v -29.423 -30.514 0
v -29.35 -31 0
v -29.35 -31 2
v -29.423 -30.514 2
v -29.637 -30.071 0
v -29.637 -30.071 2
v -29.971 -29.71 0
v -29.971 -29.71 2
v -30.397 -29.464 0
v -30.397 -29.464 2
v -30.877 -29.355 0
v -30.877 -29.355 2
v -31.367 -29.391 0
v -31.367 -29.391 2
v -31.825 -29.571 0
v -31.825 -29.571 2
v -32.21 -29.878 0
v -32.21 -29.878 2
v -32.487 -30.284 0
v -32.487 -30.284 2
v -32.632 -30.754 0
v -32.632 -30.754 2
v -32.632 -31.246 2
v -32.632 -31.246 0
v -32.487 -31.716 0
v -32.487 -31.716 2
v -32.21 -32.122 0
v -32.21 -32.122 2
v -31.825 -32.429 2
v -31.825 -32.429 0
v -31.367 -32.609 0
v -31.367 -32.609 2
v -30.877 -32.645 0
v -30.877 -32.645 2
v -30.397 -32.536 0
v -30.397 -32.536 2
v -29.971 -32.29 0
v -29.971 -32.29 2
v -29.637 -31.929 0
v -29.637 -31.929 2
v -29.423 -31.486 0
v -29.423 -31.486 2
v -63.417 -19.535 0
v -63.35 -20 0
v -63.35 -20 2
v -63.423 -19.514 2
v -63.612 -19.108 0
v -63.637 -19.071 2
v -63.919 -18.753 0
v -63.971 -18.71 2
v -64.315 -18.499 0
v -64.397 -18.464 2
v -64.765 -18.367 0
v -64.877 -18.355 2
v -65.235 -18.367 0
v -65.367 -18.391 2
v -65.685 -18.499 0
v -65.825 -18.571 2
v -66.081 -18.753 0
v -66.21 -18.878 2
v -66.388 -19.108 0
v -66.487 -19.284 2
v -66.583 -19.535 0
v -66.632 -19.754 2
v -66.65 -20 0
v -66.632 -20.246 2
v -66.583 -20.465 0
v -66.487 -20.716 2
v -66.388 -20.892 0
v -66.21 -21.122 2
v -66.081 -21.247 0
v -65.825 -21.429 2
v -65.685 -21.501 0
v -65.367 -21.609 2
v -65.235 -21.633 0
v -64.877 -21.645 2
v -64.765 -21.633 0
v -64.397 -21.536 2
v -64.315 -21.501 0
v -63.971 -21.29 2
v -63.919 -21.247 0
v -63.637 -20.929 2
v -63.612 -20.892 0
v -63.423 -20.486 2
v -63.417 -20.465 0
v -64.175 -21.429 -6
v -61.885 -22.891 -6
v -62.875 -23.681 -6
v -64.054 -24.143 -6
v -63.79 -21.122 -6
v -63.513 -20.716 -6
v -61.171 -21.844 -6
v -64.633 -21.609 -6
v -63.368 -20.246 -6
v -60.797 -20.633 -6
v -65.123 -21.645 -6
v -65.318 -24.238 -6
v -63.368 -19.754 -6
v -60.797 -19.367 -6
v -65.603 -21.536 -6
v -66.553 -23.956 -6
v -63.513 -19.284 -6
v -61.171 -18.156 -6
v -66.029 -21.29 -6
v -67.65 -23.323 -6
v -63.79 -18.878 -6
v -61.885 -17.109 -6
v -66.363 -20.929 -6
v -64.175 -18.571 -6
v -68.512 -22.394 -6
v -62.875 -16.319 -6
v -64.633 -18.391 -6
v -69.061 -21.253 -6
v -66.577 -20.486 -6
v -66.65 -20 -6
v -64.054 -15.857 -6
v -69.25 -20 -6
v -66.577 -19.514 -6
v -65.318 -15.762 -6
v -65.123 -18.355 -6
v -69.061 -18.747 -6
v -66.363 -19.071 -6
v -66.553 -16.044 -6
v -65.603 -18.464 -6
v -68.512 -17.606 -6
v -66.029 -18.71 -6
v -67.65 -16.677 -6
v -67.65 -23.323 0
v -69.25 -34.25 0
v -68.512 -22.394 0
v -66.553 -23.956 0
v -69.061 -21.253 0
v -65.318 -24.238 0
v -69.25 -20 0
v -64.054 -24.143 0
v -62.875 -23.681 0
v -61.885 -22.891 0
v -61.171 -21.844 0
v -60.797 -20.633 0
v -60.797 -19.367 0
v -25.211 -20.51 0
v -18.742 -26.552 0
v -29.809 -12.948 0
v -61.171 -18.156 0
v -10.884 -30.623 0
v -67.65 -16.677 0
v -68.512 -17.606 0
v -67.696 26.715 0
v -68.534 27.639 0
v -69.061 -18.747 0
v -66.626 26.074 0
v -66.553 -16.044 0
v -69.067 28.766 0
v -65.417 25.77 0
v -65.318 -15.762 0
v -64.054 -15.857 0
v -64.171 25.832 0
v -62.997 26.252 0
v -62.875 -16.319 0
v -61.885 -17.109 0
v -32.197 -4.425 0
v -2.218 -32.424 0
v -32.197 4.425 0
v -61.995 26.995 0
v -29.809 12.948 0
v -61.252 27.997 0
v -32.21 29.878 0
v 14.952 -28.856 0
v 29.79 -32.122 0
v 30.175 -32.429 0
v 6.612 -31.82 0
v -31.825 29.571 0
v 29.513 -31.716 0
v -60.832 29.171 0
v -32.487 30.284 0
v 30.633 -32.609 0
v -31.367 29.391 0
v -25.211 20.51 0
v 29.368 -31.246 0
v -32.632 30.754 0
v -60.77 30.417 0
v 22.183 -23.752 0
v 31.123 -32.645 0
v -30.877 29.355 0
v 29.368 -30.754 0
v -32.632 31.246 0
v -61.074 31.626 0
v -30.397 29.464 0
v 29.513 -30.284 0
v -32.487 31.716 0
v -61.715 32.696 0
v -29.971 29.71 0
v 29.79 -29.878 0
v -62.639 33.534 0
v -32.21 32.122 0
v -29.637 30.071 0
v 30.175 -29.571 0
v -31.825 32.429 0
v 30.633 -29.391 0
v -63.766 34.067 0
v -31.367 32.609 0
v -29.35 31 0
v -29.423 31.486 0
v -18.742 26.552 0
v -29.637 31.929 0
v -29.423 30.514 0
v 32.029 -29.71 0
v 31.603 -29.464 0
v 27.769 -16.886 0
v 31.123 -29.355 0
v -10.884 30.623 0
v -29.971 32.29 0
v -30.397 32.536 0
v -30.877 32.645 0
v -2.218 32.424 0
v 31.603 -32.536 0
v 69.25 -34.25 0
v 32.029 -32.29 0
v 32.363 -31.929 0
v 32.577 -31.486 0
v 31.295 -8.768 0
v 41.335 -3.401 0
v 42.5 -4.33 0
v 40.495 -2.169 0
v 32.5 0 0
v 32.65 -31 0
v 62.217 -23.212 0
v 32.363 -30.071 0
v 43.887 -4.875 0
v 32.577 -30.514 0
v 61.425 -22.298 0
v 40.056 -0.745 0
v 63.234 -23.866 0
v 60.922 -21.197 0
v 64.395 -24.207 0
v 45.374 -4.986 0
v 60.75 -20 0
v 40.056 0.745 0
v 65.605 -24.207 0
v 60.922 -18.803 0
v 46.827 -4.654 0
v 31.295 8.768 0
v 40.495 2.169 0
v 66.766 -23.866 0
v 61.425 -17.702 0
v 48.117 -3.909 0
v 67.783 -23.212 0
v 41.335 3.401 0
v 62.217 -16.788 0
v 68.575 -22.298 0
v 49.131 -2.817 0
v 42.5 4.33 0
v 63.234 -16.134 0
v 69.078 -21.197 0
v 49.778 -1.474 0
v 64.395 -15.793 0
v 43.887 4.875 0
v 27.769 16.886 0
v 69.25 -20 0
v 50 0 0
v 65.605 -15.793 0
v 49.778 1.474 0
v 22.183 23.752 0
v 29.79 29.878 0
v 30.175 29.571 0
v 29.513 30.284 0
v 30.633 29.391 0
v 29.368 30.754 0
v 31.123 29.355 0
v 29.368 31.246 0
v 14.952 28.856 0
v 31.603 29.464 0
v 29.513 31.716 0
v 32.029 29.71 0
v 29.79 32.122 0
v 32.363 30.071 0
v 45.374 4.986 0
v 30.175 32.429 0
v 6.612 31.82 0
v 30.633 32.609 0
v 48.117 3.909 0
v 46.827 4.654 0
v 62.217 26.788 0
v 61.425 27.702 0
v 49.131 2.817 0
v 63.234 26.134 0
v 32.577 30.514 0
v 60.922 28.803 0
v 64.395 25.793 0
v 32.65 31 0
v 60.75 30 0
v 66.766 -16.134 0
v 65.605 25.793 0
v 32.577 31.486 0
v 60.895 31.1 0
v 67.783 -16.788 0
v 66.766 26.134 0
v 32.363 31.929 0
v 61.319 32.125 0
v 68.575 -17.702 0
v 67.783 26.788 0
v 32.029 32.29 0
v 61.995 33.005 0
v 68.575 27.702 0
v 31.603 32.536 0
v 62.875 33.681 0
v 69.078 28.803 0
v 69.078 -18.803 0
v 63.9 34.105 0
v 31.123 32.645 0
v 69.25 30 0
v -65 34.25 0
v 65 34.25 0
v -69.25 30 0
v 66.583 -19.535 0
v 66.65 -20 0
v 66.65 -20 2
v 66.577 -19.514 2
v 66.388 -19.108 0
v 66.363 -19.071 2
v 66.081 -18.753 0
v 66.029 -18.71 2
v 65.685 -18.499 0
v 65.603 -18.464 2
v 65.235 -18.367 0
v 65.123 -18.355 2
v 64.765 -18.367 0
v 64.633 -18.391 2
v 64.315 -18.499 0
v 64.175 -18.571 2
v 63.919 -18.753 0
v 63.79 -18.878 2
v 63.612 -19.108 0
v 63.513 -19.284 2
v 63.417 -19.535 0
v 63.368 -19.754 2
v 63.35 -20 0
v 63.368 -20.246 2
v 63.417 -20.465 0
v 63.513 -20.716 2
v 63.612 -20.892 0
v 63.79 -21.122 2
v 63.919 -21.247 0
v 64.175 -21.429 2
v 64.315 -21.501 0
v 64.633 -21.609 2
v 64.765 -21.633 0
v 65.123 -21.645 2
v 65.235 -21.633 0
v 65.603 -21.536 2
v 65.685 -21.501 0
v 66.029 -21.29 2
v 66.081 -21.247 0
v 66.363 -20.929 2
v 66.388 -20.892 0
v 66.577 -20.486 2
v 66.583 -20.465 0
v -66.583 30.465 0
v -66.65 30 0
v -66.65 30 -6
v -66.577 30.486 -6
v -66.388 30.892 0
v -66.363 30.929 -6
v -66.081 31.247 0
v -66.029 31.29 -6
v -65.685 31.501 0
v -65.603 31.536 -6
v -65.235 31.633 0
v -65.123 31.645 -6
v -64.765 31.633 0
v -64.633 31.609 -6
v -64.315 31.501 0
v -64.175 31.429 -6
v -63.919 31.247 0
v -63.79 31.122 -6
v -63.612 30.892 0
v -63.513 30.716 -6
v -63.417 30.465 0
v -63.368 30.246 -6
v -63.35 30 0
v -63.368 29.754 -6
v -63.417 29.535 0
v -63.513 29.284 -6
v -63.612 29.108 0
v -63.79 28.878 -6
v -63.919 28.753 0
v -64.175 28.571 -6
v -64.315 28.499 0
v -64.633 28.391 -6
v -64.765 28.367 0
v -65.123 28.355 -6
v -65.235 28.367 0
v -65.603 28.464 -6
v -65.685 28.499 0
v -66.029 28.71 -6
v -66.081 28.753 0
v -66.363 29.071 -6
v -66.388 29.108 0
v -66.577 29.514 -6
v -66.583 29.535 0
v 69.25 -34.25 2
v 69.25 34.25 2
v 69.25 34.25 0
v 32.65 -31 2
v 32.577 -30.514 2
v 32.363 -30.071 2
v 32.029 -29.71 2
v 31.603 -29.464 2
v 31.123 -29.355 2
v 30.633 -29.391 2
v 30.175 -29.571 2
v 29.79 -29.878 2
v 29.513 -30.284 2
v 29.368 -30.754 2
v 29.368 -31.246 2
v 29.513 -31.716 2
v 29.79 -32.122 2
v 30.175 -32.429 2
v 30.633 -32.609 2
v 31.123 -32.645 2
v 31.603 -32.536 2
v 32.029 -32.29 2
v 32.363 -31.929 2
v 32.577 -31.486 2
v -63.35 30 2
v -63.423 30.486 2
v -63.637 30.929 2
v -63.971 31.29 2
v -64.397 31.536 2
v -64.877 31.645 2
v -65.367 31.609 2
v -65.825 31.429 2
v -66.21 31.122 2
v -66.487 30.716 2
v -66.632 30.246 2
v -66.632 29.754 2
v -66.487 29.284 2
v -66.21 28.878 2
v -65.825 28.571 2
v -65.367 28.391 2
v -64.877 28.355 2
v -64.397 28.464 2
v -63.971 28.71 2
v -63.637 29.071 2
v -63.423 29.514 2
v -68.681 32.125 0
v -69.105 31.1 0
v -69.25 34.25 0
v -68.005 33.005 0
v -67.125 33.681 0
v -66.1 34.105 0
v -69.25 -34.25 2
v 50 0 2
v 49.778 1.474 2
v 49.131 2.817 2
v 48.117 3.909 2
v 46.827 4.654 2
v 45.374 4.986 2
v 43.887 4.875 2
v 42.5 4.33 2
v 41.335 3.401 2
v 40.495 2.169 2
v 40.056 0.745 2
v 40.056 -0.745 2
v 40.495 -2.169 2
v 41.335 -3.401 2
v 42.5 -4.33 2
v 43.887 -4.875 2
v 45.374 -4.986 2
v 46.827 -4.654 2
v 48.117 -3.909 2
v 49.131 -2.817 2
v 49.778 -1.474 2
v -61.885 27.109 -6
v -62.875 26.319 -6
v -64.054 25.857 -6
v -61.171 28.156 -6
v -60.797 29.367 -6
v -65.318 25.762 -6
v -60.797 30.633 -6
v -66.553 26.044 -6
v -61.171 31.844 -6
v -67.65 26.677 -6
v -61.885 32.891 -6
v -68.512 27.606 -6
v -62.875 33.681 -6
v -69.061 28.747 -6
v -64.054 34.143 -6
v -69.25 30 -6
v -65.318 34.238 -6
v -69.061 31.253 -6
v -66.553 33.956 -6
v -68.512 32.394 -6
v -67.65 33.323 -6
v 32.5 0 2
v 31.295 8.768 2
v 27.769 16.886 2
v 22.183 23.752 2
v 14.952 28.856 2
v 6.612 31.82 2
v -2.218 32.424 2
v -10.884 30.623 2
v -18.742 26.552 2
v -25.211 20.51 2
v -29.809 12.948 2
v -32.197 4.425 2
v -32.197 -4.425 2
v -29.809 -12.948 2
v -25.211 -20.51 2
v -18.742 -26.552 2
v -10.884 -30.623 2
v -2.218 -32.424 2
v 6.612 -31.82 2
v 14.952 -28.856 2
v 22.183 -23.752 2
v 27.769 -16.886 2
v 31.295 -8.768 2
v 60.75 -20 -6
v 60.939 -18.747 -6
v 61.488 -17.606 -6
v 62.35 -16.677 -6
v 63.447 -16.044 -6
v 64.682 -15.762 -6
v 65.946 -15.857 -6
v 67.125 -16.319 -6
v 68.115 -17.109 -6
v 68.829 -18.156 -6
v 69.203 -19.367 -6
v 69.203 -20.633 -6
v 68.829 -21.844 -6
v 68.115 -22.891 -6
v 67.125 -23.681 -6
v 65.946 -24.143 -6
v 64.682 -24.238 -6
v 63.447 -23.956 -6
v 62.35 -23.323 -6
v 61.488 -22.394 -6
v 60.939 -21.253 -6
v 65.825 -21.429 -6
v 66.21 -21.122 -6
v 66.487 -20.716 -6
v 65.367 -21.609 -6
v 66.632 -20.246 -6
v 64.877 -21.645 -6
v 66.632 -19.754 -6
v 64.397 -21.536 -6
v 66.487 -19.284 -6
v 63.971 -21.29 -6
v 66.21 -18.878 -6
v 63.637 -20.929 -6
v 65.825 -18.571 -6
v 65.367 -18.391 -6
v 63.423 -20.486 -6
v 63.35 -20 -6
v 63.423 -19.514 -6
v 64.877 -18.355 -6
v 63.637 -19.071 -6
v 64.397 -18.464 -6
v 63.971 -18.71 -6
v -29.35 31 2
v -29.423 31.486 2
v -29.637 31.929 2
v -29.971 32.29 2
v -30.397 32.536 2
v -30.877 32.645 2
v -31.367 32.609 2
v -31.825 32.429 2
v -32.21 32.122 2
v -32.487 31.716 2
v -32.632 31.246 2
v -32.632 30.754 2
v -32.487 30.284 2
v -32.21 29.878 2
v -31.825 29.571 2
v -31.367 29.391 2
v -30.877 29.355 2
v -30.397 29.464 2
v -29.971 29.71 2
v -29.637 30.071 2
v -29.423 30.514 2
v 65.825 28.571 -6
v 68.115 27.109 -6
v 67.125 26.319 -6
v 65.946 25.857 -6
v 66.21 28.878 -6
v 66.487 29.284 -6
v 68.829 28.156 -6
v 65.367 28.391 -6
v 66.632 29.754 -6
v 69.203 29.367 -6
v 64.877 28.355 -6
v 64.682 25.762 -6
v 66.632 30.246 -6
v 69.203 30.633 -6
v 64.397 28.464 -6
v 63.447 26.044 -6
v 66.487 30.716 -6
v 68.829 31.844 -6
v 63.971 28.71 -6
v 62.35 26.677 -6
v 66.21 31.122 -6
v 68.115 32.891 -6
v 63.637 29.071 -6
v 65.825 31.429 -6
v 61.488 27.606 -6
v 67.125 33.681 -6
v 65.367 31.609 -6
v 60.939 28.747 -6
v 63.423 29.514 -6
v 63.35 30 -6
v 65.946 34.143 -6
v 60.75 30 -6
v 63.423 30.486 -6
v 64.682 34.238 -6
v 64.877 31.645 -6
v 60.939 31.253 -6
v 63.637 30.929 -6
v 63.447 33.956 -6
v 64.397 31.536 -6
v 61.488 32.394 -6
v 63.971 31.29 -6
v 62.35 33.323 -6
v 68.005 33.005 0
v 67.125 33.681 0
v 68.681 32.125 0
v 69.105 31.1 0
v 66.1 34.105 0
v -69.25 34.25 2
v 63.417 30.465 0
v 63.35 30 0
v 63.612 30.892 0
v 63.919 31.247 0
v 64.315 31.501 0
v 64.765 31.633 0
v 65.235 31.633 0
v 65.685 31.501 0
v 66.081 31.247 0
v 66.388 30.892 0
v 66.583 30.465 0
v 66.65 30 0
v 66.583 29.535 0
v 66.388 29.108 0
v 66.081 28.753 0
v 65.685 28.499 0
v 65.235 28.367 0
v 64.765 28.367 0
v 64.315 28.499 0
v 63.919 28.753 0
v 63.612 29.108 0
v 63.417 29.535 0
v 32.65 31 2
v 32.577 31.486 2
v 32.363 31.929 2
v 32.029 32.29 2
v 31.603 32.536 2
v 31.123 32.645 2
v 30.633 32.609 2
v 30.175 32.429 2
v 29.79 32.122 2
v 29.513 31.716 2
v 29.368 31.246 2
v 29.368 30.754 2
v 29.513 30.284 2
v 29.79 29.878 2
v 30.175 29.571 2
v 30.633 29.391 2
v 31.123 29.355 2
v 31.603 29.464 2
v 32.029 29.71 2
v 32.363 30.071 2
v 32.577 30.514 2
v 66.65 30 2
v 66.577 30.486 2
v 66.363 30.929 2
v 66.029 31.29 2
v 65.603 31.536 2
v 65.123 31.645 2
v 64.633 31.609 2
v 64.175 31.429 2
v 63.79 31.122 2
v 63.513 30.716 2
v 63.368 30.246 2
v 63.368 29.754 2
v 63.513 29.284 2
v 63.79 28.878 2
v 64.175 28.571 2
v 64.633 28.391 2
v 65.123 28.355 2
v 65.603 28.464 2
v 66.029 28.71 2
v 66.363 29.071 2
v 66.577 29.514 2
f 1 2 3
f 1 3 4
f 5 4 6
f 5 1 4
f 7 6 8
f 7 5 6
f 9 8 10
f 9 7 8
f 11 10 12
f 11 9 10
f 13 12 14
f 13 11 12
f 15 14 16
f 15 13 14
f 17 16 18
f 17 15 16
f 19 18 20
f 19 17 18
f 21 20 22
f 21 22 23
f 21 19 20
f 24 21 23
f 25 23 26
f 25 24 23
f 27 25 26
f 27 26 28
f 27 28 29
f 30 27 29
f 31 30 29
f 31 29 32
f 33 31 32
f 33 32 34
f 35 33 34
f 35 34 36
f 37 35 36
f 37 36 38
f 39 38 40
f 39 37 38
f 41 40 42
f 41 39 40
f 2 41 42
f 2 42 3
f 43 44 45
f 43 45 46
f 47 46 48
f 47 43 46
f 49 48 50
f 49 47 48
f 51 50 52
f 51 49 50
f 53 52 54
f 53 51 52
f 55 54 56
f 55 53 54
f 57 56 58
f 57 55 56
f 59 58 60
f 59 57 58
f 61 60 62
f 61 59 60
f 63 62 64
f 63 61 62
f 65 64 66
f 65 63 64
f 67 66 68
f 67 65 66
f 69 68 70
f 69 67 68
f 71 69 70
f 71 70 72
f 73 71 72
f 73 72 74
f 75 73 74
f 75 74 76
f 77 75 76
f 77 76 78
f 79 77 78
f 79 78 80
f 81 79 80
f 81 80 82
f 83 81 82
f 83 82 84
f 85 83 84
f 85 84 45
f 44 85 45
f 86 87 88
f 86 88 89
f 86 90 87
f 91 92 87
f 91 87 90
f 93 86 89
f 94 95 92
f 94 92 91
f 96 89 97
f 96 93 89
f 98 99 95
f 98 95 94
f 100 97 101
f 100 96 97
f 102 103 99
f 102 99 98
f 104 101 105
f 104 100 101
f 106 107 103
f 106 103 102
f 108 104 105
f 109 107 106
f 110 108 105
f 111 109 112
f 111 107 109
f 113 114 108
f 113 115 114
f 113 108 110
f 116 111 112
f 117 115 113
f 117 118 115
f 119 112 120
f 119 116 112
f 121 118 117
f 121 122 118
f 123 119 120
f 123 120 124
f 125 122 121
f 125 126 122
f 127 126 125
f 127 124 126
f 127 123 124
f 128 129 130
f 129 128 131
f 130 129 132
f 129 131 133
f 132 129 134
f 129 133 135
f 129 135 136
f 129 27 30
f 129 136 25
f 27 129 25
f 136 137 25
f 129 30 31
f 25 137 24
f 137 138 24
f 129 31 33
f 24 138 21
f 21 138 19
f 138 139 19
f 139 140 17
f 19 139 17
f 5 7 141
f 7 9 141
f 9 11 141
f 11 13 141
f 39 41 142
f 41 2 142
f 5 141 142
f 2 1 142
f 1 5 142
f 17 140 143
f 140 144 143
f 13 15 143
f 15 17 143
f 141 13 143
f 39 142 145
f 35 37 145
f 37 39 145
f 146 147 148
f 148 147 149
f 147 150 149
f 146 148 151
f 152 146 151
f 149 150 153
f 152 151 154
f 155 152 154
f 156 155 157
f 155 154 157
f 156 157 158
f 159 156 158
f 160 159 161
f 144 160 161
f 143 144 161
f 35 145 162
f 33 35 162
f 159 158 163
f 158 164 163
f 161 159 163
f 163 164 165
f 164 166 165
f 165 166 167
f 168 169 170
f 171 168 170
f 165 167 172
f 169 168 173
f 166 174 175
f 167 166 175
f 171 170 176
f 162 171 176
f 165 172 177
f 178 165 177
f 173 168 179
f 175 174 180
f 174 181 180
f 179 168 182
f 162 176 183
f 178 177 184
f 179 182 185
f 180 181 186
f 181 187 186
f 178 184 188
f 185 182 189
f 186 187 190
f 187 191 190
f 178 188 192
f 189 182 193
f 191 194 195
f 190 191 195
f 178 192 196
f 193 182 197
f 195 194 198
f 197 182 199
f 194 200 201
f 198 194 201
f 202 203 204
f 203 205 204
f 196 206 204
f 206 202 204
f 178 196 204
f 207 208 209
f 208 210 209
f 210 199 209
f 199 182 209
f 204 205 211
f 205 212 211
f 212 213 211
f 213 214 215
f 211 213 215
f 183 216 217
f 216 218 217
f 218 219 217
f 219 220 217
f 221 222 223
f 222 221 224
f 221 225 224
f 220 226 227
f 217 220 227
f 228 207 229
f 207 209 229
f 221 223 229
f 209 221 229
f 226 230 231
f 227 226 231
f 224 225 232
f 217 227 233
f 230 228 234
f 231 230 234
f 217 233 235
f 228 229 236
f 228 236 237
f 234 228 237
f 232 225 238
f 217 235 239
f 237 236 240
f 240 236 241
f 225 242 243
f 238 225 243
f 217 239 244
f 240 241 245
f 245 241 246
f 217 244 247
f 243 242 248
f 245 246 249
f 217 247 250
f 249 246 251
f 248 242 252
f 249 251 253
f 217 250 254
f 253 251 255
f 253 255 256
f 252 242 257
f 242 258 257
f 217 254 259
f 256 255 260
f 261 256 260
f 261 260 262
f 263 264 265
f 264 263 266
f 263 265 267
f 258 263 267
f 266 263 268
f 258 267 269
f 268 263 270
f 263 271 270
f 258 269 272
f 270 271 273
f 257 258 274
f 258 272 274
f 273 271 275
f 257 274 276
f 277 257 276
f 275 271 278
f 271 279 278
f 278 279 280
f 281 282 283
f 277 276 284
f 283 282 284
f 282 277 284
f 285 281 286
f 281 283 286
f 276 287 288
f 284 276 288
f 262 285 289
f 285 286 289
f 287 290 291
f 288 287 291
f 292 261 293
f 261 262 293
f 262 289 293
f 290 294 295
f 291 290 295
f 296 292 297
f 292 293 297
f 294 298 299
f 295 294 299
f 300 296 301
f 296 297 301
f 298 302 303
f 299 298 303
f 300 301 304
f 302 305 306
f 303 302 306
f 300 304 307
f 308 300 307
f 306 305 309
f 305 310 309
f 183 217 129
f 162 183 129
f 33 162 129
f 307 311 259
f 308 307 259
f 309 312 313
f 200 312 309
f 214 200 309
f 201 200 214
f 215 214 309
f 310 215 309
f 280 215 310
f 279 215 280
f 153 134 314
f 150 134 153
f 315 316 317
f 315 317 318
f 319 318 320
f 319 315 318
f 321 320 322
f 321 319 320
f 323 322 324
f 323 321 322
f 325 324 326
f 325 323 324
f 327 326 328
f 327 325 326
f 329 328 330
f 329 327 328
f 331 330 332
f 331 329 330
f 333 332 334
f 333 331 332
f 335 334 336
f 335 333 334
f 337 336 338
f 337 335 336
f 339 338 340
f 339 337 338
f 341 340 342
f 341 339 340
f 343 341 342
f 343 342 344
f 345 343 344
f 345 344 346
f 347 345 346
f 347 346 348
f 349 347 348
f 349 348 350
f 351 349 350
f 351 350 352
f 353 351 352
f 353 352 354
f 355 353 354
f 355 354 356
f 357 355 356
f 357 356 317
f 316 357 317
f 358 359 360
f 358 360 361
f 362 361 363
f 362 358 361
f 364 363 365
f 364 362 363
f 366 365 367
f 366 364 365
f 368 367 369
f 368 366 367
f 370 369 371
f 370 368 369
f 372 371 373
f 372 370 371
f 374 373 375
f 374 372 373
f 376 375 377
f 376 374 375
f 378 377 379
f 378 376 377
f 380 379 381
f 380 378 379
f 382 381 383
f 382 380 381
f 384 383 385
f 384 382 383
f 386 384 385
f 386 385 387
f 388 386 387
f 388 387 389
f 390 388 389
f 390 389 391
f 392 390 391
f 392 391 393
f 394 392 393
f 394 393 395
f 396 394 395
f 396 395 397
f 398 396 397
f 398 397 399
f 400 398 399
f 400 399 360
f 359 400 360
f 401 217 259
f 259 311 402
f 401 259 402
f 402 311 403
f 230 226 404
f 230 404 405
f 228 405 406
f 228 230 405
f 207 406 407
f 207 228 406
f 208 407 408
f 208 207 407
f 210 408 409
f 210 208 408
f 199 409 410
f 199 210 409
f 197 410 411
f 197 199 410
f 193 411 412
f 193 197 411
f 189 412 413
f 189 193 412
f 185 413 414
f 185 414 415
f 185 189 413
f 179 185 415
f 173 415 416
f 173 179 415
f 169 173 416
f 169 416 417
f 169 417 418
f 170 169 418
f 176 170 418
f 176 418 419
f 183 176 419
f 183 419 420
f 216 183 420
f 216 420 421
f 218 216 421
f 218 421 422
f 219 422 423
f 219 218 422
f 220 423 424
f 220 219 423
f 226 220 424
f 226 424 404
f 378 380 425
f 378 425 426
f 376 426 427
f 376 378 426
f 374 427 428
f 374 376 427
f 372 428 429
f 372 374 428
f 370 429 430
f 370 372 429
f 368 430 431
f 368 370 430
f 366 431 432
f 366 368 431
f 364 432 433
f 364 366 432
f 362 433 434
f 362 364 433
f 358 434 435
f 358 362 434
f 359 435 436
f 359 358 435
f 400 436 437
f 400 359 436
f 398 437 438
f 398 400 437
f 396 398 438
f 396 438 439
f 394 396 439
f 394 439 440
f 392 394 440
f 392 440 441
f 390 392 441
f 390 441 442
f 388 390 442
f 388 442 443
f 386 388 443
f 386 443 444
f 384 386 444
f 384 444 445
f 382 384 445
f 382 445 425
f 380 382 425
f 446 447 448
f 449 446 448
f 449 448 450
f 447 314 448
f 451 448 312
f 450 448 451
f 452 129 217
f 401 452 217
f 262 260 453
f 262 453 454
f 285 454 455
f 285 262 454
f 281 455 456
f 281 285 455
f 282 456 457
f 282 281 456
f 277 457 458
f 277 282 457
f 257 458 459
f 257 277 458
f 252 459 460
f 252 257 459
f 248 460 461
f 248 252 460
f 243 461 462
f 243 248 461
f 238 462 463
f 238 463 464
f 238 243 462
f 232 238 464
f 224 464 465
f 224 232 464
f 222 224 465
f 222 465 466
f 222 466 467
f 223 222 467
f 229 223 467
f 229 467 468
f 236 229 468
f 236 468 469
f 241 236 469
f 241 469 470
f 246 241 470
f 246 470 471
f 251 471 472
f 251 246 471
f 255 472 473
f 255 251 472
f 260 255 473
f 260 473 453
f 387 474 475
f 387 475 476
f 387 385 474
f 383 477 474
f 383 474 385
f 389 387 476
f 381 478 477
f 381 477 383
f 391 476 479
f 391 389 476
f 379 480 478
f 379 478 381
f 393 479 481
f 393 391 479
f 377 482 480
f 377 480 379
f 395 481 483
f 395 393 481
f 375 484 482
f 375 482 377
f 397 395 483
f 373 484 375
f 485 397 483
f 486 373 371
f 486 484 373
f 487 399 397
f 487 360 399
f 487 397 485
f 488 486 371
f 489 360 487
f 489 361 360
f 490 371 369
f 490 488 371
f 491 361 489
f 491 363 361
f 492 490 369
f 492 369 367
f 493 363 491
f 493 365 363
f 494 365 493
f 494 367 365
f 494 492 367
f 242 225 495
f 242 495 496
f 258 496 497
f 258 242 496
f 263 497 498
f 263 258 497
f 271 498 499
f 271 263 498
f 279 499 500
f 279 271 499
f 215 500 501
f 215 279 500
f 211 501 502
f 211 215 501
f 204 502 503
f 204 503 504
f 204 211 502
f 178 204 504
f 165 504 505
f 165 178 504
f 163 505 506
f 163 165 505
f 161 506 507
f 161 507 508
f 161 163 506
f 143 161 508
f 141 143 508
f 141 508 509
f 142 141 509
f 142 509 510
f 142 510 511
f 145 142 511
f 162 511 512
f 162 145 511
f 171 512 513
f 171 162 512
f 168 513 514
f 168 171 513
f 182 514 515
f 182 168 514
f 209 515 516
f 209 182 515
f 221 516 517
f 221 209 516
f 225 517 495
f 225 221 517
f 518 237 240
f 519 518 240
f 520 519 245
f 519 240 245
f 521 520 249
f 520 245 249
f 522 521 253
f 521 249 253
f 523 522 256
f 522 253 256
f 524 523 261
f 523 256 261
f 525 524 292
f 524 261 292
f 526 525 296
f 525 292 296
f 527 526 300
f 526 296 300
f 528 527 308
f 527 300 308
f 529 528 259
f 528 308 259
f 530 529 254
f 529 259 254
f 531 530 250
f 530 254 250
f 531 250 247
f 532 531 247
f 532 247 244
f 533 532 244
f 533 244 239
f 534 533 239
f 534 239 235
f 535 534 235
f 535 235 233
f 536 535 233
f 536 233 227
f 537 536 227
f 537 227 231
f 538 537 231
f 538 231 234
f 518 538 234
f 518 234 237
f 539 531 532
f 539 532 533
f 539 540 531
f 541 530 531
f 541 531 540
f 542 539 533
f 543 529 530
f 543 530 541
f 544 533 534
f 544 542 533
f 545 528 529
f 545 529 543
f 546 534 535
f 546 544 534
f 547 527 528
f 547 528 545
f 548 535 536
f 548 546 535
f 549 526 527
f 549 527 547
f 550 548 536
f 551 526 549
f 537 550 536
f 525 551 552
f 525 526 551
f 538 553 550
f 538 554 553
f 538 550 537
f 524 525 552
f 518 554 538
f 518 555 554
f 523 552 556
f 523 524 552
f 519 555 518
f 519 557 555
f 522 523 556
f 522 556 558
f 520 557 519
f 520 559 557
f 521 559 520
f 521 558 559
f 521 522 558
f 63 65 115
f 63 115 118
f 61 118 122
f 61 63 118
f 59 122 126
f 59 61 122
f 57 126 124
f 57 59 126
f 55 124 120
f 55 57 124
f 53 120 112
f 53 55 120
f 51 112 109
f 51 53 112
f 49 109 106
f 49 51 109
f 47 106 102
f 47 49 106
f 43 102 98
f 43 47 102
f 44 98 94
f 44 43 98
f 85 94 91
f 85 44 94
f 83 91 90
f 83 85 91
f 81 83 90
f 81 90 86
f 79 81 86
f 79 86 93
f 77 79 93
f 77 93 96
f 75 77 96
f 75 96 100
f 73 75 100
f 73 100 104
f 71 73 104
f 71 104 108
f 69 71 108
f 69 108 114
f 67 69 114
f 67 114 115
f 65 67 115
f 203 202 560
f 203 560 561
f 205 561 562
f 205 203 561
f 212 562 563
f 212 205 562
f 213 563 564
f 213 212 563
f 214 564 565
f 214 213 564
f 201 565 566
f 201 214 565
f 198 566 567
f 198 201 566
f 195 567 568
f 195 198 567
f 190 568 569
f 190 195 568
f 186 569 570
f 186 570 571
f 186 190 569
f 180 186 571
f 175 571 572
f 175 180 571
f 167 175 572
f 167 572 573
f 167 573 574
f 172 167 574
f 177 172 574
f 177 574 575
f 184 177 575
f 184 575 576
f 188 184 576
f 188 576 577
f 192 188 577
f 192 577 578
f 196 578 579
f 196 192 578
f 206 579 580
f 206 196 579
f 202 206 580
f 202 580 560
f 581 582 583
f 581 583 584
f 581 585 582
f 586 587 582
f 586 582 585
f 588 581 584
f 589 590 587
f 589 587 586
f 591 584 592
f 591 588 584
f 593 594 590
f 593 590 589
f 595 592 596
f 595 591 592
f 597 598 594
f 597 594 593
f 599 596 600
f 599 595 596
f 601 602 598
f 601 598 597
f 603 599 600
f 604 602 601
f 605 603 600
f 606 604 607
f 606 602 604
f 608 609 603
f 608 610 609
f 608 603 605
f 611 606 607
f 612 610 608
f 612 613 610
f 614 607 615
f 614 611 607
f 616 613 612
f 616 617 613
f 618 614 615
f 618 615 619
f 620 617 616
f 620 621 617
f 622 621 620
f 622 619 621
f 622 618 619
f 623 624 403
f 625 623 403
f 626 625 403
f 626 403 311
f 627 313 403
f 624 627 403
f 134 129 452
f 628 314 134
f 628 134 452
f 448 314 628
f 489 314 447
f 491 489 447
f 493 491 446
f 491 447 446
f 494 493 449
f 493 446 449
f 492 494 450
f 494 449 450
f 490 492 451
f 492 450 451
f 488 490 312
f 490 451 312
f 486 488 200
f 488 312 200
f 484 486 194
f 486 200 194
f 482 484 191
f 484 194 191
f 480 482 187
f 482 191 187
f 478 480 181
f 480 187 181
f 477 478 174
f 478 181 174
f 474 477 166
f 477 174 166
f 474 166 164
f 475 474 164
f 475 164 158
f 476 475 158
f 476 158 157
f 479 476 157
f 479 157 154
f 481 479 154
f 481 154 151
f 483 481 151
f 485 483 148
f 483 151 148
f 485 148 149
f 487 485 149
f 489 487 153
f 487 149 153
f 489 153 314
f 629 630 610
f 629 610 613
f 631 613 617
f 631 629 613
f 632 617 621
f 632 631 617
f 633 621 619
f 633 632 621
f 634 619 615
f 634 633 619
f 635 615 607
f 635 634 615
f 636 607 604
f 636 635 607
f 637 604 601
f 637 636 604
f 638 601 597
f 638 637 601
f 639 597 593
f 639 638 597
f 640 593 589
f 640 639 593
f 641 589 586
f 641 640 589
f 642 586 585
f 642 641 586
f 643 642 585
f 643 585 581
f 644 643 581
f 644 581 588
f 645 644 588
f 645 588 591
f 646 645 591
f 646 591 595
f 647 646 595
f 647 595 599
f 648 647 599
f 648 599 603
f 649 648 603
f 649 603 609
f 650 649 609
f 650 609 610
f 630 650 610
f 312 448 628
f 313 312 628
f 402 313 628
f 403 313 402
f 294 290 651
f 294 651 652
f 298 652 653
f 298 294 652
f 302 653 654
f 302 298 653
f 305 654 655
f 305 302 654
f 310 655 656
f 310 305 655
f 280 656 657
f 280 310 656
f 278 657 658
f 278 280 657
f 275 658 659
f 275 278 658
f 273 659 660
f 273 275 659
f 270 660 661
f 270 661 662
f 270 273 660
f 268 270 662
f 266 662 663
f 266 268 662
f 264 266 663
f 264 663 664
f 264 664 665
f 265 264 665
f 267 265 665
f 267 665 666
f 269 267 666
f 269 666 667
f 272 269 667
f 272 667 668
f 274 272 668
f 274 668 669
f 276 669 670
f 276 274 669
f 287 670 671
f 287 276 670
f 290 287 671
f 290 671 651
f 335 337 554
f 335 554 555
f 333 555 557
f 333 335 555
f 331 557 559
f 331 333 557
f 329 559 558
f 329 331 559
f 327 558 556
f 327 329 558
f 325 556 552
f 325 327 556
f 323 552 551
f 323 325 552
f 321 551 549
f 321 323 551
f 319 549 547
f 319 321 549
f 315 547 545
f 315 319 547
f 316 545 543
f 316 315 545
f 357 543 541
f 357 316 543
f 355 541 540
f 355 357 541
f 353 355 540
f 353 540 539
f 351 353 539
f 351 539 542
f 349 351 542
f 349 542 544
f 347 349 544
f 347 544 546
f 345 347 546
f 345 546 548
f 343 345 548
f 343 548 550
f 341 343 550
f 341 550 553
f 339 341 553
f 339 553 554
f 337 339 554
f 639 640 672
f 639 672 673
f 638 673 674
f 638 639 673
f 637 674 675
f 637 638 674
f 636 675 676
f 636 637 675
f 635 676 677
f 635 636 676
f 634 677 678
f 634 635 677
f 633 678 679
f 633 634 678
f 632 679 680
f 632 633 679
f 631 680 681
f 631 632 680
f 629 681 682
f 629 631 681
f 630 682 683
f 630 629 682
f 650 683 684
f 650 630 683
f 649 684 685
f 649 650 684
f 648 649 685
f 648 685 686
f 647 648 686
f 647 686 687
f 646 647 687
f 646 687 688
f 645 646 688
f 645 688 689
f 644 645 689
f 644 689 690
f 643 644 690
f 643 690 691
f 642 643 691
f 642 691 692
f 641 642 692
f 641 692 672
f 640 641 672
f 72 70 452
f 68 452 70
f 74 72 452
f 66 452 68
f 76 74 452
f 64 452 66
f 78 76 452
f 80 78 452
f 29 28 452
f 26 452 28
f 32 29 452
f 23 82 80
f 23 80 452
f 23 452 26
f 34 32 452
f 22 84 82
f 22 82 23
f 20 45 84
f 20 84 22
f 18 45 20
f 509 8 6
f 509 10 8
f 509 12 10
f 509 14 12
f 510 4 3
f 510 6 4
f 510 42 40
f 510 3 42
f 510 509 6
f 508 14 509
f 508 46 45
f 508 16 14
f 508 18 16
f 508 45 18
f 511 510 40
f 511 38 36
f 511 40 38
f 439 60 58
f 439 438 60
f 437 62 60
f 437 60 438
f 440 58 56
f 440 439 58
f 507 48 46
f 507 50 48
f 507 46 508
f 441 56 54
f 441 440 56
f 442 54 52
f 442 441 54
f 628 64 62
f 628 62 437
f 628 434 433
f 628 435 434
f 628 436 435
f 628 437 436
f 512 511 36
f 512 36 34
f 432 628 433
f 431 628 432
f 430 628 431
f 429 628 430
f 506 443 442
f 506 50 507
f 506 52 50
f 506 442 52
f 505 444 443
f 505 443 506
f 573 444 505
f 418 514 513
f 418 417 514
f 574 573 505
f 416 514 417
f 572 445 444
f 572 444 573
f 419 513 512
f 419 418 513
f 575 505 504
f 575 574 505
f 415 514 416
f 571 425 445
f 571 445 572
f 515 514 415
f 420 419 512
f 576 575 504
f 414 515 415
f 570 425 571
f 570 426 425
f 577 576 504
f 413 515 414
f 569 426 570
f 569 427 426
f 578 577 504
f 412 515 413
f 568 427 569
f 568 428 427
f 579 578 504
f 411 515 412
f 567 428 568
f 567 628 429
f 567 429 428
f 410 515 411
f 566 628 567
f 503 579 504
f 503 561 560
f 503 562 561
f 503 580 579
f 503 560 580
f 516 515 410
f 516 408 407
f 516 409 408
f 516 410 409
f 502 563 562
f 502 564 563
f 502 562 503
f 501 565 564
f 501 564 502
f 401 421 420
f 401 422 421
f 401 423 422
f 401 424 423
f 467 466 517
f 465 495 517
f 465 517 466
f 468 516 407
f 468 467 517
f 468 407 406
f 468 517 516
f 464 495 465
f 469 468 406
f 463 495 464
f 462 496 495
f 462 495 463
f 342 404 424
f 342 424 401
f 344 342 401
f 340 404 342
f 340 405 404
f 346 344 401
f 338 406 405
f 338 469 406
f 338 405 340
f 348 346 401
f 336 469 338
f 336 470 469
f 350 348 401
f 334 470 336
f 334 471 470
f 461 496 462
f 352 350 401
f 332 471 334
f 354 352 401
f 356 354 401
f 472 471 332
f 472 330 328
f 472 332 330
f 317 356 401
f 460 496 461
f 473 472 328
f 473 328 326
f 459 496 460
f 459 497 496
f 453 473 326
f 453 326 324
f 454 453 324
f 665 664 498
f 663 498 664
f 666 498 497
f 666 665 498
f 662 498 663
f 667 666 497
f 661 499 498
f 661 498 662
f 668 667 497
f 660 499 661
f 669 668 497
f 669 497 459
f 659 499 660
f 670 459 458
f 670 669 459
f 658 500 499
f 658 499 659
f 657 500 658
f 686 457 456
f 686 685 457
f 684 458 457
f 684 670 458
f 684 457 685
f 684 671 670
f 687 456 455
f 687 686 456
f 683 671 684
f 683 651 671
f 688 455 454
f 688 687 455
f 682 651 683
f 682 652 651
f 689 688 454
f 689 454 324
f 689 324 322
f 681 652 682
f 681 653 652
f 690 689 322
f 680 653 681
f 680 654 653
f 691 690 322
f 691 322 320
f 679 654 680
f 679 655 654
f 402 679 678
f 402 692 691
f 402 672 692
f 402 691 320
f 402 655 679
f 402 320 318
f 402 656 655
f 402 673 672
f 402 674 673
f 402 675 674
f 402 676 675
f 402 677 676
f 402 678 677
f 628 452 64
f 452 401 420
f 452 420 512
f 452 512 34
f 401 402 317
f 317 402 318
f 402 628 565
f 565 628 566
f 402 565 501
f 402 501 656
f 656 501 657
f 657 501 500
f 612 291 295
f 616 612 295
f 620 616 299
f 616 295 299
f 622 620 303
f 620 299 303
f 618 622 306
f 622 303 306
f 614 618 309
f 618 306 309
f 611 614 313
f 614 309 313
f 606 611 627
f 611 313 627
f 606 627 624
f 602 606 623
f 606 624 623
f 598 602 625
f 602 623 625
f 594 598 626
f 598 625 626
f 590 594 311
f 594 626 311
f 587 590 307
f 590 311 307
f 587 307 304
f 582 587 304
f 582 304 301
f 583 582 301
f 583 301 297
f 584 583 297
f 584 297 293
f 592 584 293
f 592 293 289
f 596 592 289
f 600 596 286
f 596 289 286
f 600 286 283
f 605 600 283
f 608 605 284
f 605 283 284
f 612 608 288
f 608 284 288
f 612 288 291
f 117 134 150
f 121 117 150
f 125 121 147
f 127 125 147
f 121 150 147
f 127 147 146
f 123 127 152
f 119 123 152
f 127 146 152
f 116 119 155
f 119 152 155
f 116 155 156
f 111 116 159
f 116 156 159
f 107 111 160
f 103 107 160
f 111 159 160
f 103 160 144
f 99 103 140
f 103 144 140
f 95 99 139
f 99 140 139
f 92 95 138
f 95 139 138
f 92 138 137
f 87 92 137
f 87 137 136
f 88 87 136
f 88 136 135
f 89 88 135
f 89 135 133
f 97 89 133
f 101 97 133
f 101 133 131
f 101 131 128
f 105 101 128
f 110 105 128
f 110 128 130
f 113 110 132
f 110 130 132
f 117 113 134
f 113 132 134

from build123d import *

# Parameters (mm, degrees)
ESBO_O1_W                = 138.5
ESBO_O1_H                = 68.5
ESBO_O1_R                = 1.65
ESBO_O1_R_2              = 32.5
ESBO_O1_R_3              = 5
RESSALTO_EXTRUS_O1_DEPTH = 2
ESBO_O2_R                = 4.25
ESBO_O2_R_2              = 1.65
RESSALTO_EXTRUS_O2_DEPTH = 6


with BuildPart() as part:
    # Esboço1 → Ressalto-extrusão1 (new body)
    with BuildSketch(Plane.XY):
        Rectangle(ESBO_O1_W, ESBO_O1_H)
        with Locations((-65, 30)):
            Circle(ESBO_O1_R, mode=Mode.SUBTRACT)
        with Locations((-65, -20)):
            Circle(ESBO_O1_R, mode=Mode.SUBTRACT)
        with Locations((65, -20)):
            Circle(ESBO_O1_R, mode=Mode.SUBTRACT)
        with Locations((65, 30)):
            Circle(ESBO_O1_R, mode=Mode.SUBTRACT)
        Circle(ESBO_O1_R_2, mode=Mode.SUBTRACT)
        with Locations((-31, 31)):
            Circle(ESBO_O1_R, mode=Mode.SUBTRACT)
        with Locations((-31, -31)):
            Circle(ESBO_O1_R, mode=Mode.SUBTRACT)
        with Locations((31, -31)):
            Circle(ESBO_O1_R, mode=Mode.SUBTRACT)
        with Locations((31, 31)):
            Circle(ESBO_O1_R, mode=Mode.SUBTRACT)
        with Locations((45, 0)):
            Circle(ESBO_O1_R_3, mode=Mode.SUBTRACT)
    extrude(amount=RESSALTO_EXTRUS_O1_DEPTH)

    # Esboço2 → Ressalto-extrusão2 (add)
    with BuildSketch(Plane(origin=(0, 0, 0), x_dir=(-1, 0, 0), z_dir=(0, 0, -1))):
        with Locations((65, 30)):
            Circle(ESBO_O2_R)
        with Locations((65, 30)):
            Circle(ESBO_O2_R_2, mode=Mode.SUBTRACT)
        with Locations((65, -20)):
            Circle(ESBO_O2_R)
        with Locations((65, -20)):
            Circle(ESBO_O2_R_2, mode=Mode.SUBTRACT)
        with Locations((-65, -20)):
            Circle(ESBO_O2_R)
        with Locations((-65, -20)):
            Circle(ESBO_O2_R_2, mode=Mode.SUBTRACT)
        with Locations((-65, 30)):
            Circle(ESBO_O2_R)
        with Locations((-65, 30)):
            Circle(ESBO_O2_R_2, mode=Mode.SUBTRACT)
    extrude(amount=RESSALTO_EXTRUS_O2_DEPTH)


solid = part.part
